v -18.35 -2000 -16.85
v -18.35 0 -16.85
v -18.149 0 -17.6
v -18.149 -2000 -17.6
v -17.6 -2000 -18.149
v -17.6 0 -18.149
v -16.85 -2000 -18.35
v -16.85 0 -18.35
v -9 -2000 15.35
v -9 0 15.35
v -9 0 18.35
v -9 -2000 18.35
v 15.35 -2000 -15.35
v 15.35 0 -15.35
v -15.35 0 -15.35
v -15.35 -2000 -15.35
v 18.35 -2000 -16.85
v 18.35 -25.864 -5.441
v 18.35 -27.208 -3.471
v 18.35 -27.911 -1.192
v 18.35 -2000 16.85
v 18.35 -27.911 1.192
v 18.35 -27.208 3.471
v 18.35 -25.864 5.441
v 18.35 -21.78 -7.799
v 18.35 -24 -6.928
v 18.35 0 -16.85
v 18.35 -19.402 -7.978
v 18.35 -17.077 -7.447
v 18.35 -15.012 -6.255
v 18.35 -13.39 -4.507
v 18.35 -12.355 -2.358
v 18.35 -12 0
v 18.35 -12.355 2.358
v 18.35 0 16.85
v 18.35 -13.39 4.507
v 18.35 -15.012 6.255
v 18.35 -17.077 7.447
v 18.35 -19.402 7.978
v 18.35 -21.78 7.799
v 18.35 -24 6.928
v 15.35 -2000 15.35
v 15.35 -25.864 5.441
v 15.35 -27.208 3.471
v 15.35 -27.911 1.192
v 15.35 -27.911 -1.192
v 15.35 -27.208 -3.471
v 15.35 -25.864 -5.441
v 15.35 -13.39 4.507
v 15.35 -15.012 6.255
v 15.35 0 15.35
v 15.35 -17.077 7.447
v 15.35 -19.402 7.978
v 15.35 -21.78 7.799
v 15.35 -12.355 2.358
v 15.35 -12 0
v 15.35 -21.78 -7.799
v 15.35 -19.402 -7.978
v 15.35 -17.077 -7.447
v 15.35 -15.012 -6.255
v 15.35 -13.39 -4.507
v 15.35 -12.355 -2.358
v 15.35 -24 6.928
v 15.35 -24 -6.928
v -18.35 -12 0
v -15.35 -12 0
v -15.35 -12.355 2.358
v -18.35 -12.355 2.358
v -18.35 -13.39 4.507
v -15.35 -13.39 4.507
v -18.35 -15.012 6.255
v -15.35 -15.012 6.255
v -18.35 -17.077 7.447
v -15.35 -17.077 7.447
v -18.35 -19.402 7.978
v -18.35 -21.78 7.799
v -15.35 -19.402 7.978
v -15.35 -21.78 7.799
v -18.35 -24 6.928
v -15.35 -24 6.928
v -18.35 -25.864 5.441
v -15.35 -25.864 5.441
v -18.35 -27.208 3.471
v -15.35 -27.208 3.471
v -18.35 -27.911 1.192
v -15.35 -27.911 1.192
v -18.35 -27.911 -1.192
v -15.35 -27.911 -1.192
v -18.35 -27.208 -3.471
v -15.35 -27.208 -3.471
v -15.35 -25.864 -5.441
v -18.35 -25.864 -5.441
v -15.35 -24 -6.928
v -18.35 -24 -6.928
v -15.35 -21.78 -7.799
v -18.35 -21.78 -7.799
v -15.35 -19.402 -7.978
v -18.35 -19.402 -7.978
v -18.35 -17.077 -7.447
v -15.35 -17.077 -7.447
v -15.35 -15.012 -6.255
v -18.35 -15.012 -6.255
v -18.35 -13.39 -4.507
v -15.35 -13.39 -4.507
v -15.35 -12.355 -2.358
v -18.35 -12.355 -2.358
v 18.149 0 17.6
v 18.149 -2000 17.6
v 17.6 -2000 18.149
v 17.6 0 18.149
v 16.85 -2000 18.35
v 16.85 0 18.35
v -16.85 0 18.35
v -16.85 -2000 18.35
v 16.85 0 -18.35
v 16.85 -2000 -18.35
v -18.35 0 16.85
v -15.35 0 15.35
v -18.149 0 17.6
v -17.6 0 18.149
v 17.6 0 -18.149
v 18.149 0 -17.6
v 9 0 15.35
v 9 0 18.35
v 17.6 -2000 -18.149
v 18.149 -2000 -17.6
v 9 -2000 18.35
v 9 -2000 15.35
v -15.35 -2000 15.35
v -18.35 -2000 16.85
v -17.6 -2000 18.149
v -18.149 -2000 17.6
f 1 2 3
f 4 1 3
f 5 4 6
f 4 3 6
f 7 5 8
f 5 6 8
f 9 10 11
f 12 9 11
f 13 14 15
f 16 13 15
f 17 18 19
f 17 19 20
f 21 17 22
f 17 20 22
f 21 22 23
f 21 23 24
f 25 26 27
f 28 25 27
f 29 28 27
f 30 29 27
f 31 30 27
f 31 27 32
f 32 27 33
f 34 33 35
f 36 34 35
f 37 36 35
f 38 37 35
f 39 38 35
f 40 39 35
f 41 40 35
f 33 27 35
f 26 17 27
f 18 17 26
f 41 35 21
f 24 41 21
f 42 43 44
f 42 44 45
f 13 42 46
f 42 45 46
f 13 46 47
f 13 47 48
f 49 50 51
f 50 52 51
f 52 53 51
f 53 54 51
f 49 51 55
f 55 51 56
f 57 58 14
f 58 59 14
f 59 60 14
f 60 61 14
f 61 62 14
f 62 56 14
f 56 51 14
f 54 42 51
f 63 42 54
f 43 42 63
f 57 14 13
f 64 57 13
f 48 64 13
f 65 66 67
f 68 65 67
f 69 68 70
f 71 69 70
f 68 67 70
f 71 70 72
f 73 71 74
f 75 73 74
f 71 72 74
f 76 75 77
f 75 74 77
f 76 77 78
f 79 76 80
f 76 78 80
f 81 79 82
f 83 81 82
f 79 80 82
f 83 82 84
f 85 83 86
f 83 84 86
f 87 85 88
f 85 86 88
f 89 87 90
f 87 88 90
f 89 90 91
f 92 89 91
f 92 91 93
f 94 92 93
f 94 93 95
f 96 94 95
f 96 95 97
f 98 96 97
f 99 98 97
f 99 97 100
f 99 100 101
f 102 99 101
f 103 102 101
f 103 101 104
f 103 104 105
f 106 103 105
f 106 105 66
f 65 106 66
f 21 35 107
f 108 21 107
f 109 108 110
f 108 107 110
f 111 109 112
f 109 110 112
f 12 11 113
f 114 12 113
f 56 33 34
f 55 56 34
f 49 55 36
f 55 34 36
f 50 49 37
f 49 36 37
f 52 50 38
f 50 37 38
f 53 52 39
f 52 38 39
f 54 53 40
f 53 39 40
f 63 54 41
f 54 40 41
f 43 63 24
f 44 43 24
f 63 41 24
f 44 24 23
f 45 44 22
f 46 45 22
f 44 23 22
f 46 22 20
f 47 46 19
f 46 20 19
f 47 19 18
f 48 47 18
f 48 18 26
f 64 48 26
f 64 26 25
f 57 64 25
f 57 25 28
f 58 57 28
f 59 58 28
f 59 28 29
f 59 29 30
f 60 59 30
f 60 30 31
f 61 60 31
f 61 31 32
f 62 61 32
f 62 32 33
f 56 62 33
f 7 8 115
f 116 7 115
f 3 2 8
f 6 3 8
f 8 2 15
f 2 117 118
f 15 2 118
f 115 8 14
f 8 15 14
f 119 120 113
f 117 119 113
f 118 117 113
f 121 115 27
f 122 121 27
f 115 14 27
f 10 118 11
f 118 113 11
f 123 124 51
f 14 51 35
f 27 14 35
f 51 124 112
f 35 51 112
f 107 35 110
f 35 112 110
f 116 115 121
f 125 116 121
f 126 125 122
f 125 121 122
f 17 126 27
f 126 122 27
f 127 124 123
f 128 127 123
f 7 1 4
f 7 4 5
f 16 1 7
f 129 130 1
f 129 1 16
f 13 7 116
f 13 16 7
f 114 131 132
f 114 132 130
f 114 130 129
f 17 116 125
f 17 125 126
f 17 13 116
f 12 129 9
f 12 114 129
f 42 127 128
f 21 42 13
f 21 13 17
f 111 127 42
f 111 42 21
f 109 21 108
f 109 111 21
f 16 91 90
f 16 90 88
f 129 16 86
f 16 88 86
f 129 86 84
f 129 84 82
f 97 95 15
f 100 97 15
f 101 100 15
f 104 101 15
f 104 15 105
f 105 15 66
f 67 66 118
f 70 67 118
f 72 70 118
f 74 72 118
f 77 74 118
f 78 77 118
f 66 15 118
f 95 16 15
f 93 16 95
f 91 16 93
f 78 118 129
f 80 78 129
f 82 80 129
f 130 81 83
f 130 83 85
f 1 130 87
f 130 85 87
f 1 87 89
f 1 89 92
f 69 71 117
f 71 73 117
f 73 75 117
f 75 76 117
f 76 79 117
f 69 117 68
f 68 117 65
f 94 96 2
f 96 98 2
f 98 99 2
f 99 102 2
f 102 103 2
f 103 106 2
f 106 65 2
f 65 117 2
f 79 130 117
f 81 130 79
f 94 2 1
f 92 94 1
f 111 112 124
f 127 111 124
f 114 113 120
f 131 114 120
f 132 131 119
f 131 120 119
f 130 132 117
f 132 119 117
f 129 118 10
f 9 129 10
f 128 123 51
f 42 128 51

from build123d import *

# Parameters (mm, degrees)
F1_DEPTH = 2000
F2_R     = 8
F3_DEPTH = 36.701


with BuildPart() as f1:
    # F0 (on Front) → F1 (new body)
    with BuildSketch(Plane.XZ):
        with BuildLine():
            Line((15.35, 15.35), (15.35, -15.35))
            Line((15.35, -15.35), (-15.35, -15.35))
            Line((-15.35, -15.35), (-15.35, 15.35))
            Line((-15.35, 15.35), (-9, 15.35))
            Line((-9, 15.35), (-9, 18.35))
            Line((-9, 18.35), (-16.85, 18.35))
            ThreePointArc((-16.85, 18.35), (-17.91066, 17.91066), (-18.35, 16.85))
            Line((-18.35, 16.85), (-18.35, -16.85))
            ThreePointArc((-18.35, -16.85), (-17.91066, -17.91066), (-16.85, -18.35))
            Line((-16.85, -18.35), (16.85, -18.35))
            ThreePointArc((16.85, -18.35), (17.91066, -17.91066), (18.35, -16.85))
            Line((18.35, -16.85), (18.35, 16.85))
            ThreePointArc((18.35, 16.85), (17.91066, 17.91066), (16.85, 18.35))
            Line((16.85, 18.35), (9, 18.35))
            Line((9, 18.35), (9, 15.35))
            Line((9, 15.35), (15.35, 15.35))
        make_face()
    extrude(amount=F1_DEPTH)

    # F2 (on face) → F3 (cut, through all)
    with BuildSketch(Plane.YZ.offset(18.35)):
        with Locations((-20, 0)):
            Circle(F2_R)
    extrude(amount=-F3_DEPTH, mode=Mode.SUBTRACT)


solid = f1.part
